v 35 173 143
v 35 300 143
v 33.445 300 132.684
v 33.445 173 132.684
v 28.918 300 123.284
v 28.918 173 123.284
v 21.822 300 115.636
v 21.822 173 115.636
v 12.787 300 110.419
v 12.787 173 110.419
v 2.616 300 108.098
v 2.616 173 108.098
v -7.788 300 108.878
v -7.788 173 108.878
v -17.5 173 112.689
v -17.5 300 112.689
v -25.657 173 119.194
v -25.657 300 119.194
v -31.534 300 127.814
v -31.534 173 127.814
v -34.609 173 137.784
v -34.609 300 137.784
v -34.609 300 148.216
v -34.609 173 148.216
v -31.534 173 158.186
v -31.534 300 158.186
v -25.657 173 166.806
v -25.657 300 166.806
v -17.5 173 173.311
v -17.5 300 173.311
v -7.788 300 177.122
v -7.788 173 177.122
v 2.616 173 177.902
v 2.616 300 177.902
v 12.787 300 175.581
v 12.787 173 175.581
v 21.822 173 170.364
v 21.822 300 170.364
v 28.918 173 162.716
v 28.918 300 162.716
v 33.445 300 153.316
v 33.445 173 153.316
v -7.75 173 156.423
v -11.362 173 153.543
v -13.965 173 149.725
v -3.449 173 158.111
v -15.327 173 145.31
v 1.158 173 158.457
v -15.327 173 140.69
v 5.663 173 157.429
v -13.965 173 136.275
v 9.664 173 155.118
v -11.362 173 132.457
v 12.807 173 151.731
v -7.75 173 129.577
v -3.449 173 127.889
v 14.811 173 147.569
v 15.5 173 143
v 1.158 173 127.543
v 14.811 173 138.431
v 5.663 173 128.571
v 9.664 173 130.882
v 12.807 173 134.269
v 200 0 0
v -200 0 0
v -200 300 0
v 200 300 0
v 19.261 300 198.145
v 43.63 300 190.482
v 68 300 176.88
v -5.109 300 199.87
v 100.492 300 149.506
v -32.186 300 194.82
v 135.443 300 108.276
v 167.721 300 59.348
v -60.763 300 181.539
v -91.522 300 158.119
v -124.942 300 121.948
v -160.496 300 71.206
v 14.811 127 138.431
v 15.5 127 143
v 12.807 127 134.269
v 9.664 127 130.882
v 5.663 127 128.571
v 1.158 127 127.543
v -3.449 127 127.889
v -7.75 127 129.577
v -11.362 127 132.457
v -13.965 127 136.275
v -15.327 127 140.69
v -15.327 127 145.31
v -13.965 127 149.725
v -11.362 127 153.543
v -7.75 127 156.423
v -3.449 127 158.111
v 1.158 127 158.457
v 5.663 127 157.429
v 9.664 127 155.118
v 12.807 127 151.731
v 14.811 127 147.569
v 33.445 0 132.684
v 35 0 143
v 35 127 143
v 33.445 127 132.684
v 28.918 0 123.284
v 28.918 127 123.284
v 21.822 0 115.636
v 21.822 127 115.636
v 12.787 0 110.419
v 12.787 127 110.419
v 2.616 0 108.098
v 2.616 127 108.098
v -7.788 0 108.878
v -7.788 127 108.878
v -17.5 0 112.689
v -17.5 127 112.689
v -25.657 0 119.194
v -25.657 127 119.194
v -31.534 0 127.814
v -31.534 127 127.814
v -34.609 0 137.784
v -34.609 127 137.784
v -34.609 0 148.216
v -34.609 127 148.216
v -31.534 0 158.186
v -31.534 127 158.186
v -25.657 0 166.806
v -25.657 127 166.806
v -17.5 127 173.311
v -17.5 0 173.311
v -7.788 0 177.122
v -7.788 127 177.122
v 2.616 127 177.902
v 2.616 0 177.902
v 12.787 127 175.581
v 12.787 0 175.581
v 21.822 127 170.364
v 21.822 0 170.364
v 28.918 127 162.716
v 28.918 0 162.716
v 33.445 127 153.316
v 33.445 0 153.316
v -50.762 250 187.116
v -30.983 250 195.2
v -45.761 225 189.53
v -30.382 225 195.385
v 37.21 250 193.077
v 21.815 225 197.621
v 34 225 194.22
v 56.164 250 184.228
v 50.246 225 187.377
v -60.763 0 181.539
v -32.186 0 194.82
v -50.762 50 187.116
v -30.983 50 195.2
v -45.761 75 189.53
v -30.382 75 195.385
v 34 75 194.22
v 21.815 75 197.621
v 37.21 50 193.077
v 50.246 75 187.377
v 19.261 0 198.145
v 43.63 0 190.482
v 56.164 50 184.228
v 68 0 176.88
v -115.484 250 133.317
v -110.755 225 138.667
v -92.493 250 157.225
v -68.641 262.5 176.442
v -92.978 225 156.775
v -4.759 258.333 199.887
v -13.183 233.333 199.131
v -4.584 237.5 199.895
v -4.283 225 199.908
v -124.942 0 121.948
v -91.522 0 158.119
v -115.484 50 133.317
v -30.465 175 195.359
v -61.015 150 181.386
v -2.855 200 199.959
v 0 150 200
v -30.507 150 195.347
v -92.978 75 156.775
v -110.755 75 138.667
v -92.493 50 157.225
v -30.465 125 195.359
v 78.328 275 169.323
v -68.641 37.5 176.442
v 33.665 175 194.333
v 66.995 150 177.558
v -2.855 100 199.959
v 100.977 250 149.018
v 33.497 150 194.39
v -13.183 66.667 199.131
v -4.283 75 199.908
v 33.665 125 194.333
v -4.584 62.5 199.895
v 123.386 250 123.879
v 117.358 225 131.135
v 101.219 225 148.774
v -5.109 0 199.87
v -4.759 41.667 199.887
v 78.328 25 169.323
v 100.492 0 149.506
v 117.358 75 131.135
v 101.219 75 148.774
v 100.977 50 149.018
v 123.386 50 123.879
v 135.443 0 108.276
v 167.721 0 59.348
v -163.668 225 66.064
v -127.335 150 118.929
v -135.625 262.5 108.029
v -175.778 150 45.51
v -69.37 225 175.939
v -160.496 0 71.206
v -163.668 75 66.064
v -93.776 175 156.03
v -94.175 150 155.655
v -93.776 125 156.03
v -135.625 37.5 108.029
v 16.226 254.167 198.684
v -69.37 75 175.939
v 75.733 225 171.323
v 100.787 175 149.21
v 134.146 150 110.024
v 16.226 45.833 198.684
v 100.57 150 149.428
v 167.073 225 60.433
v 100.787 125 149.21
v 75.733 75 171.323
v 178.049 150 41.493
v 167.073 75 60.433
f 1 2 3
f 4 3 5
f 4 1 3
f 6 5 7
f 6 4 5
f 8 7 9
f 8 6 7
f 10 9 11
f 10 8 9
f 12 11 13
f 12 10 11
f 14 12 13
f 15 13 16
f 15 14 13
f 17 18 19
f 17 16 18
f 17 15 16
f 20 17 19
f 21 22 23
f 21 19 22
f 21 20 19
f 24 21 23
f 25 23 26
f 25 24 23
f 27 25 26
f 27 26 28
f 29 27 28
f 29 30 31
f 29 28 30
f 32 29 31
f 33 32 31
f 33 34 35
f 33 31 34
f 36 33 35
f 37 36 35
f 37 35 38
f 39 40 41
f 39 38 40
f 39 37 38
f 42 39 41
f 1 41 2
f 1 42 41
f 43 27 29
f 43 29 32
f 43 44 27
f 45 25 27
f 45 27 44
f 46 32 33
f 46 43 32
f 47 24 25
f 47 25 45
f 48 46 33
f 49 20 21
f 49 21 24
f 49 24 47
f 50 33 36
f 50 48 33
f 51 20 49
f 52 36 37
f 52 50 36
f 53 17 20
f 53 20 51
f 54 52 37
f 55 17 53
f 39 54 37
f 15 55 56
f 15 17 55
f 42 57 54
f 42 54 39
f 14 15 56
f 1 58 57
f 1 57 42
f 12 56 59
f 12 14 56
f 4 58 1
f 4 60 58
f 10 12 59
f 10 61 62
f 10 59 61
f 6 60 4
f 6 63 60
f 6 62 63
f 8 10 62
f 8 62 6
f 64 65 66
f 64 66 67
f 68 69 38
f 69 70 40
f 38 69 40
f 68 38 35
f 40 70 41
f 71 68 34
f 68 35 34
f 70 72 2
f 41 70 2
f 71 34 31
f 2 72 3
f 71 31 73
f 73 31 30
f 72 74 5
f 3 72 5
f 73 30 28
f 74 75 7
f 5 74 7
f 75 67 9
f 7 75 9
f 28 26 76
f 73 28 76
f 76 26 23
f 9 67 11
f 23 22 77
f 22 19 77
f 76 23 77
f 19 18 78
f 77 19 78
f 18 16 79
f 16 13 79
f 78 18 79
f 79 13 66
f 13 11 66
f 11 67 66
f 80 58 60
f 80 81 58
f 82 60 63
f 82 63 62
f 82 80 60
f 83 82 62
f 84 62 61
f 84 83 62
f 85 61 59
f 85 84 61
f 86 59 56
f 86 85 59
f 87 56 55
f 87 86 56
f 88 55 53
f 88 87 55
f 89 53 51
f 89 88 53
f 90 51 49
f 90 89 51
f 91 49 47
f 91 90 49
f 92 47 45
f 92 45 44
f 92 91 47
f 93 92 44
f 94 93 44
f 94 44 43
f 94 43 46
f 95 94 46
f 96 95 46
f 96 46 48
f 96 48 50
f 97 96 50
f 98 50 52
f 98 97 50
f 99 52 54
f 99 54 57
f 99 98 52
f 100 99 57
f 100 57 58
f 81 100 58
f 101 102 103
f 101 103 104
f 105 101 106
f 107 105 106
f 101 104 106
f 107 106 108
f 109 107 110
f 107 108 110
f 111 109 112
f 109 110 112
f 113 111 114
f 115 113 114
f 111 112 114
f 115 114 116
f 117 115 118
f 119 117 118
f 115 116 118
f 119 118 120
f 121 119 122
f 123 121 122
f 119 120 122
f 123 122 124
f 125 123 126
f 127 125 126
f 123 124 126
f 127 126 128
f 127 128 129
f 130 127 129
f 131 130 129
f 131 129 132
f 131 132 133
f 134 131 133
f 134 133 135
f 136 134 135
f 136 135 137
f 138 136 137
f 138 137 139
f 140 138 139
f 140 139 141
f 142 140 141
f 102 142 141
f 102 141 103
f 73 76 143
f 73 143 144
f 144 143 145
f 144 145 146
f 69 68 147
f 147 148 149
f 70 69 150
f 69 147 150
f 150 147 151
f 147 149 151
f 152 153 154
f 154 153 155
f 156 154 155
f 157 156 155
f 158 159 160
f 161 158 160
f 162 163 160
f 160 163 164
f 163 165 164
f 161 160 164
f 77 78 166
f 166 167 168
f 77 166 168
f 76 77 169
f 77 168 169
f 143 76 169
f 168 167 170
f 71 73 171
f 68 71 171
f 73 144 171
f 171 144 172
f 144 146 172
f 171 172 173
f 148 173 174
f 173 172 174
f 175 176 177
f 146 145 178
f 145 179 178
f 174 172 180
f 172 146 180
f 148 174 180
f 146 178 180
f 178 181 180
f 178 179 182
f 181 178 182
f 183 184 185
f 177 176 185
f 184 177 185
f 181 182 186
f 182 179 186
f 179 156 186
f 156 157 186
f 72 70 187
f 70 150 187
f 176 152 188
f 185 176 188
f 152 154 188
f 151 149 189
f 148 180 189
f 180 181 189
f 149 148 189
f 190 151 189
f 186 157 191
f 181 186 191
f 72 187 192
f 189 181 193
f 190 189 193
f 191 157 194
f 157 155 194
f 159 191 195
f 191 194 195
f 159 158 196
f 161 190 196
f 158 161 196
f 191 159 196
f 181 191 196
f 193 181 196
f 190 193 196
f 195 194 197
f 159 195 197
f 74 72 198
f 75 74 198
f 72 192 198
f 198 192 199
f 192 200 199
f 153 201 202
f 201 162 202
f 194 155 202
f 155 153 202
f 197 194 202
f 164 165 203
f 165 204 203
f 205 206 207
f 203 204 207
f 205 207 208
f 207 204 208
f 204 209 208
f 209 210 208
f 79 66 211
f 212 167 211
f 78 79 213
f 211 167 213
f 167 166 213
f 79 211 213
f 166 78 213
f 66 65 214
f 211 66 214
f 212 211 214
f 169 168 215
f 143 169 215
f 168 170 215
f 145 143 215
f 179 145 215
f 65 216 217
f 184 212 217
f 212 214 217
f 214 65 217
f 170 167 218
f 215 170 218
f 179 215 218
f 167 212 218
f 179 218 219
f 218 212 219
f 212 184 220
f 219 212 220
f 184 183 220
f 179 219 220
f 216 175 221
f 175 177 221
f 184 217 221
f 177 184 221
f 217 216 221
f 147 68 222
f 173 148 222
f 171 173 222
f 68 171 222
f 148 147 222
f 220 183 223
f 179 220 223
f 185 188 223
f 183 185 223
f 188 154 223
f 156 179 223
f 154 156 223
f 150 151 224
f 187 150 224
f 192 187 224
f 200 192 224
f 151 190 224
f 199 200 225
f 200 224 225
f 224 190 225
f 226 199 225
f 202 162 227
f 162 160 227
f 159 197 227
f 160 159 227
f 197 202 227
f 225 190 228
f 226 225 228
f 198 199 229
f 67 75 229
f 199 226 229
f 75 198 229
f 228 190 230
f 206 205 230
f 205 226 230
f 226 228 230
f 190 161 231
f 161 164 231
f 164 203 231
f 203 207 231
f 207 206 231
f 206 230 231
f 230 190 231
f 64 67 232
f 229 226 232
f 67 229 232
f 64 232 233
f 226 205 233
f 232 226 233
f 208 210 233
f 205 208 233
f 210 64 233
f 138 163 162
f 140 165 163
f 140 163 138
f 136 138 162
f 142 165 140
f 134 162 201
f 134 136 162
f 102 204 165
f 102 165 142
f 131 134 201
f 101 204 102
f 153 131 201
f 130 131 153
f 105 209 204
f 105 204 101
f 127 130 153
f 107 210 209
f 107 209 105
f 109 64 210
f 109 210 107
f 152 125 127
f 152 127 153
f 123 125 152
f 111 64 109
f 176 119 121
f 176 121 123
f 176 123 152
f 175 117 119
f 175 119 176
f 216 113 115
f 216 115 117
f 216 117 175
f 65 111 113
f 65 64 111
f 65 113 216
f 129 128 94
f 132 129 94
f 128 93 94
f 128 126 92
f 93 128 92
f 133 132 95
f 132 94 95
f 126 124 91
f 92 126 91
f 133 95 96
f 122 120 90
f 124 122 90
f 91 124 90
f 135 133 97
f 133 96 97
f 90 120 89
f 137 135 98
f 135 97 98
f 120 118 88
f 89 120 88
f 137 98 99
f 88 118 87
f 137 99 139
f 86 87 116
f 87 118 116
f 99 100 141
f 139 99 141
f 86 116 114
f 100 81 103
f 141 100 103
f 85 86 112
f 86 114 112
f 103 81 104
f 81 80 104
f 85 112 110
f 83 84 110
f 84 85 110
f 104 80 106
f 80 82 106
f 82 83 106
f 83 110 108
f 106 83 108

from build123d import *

# Parameters (mm, degrees)
BOSS_EXTRUDE1_DEPTH     = 300
SKETCH3_R               = 15.5
CUT_EXTRUDE1_DEPTH      = 23
CUT_EXTRUDE1_DEPTH_BACK = 23
SKETCH4_R               = 35
CUT_EXTRUDE3_DEPTH      = 300


with BuildPart() as part:
    # Sketch1 → Boss-Extrude1 (new body)
    with BuildSketch(Plane(origin=(0, 0, 0), x_dir=(1, 0, 0), z_dir=(0, 1, 0))):
        with BuildLine():
            Line((-200, 1e-09), (200, 1e-09))
            add(Edge.make_bspline(
                [(-200, 1e-09), (0, -400.000000001), (200, 1e-09)],
                knots=[0.056028396, 0.056028396, 0.056028396, 0.943971604, 0.943971604, 0.943971604], degree=2))
        make_face()
    extrude(amount=BOSS_EXTRUDE1_DEPTH)

    # Sketch3 → Cut-Extrude1 (cut, two sides)
    with BuildSketch(Plane(origin=(0, 150, 0), x_dir=(1, 0, 0), z_dir=(0, 1, 0))) as cut_extrude1_sk:
        with Locations((0, -142.999999999)):
            Circle(SKETCH3_R)
    extrude(amount=CUT_EXTRUDE1_DEPTH, mode=Mode.SUBTRACT)
    extrude(cut_extrude1_sk.sketch, amount=-CUT_EXTRUDE1_DEPTH_BACK, mode=Mode.SUBTRACT)

    # Sketch4 → Cut-Extrude3 (cut)
    with BuildSketch(Plane(origin=(0, 173, 0), x_dir=(1, 0, 0), z_dir=(0, 1, 0))):
        with Locations((0, -142.999999999)):
            Circle(SKETCH4_R)
    cut_extrude3 = extrude(amount=CUT_EXTRUDE3_DEPTH, mode=Mode.SUBTRACT)

    # Mirror1: Cut-Extrude3 across plane
    add(cut_extrude3.mirror(Plane.ZX.offset(150)), mode=Mode.SUBTRACT)


solid = part.part
